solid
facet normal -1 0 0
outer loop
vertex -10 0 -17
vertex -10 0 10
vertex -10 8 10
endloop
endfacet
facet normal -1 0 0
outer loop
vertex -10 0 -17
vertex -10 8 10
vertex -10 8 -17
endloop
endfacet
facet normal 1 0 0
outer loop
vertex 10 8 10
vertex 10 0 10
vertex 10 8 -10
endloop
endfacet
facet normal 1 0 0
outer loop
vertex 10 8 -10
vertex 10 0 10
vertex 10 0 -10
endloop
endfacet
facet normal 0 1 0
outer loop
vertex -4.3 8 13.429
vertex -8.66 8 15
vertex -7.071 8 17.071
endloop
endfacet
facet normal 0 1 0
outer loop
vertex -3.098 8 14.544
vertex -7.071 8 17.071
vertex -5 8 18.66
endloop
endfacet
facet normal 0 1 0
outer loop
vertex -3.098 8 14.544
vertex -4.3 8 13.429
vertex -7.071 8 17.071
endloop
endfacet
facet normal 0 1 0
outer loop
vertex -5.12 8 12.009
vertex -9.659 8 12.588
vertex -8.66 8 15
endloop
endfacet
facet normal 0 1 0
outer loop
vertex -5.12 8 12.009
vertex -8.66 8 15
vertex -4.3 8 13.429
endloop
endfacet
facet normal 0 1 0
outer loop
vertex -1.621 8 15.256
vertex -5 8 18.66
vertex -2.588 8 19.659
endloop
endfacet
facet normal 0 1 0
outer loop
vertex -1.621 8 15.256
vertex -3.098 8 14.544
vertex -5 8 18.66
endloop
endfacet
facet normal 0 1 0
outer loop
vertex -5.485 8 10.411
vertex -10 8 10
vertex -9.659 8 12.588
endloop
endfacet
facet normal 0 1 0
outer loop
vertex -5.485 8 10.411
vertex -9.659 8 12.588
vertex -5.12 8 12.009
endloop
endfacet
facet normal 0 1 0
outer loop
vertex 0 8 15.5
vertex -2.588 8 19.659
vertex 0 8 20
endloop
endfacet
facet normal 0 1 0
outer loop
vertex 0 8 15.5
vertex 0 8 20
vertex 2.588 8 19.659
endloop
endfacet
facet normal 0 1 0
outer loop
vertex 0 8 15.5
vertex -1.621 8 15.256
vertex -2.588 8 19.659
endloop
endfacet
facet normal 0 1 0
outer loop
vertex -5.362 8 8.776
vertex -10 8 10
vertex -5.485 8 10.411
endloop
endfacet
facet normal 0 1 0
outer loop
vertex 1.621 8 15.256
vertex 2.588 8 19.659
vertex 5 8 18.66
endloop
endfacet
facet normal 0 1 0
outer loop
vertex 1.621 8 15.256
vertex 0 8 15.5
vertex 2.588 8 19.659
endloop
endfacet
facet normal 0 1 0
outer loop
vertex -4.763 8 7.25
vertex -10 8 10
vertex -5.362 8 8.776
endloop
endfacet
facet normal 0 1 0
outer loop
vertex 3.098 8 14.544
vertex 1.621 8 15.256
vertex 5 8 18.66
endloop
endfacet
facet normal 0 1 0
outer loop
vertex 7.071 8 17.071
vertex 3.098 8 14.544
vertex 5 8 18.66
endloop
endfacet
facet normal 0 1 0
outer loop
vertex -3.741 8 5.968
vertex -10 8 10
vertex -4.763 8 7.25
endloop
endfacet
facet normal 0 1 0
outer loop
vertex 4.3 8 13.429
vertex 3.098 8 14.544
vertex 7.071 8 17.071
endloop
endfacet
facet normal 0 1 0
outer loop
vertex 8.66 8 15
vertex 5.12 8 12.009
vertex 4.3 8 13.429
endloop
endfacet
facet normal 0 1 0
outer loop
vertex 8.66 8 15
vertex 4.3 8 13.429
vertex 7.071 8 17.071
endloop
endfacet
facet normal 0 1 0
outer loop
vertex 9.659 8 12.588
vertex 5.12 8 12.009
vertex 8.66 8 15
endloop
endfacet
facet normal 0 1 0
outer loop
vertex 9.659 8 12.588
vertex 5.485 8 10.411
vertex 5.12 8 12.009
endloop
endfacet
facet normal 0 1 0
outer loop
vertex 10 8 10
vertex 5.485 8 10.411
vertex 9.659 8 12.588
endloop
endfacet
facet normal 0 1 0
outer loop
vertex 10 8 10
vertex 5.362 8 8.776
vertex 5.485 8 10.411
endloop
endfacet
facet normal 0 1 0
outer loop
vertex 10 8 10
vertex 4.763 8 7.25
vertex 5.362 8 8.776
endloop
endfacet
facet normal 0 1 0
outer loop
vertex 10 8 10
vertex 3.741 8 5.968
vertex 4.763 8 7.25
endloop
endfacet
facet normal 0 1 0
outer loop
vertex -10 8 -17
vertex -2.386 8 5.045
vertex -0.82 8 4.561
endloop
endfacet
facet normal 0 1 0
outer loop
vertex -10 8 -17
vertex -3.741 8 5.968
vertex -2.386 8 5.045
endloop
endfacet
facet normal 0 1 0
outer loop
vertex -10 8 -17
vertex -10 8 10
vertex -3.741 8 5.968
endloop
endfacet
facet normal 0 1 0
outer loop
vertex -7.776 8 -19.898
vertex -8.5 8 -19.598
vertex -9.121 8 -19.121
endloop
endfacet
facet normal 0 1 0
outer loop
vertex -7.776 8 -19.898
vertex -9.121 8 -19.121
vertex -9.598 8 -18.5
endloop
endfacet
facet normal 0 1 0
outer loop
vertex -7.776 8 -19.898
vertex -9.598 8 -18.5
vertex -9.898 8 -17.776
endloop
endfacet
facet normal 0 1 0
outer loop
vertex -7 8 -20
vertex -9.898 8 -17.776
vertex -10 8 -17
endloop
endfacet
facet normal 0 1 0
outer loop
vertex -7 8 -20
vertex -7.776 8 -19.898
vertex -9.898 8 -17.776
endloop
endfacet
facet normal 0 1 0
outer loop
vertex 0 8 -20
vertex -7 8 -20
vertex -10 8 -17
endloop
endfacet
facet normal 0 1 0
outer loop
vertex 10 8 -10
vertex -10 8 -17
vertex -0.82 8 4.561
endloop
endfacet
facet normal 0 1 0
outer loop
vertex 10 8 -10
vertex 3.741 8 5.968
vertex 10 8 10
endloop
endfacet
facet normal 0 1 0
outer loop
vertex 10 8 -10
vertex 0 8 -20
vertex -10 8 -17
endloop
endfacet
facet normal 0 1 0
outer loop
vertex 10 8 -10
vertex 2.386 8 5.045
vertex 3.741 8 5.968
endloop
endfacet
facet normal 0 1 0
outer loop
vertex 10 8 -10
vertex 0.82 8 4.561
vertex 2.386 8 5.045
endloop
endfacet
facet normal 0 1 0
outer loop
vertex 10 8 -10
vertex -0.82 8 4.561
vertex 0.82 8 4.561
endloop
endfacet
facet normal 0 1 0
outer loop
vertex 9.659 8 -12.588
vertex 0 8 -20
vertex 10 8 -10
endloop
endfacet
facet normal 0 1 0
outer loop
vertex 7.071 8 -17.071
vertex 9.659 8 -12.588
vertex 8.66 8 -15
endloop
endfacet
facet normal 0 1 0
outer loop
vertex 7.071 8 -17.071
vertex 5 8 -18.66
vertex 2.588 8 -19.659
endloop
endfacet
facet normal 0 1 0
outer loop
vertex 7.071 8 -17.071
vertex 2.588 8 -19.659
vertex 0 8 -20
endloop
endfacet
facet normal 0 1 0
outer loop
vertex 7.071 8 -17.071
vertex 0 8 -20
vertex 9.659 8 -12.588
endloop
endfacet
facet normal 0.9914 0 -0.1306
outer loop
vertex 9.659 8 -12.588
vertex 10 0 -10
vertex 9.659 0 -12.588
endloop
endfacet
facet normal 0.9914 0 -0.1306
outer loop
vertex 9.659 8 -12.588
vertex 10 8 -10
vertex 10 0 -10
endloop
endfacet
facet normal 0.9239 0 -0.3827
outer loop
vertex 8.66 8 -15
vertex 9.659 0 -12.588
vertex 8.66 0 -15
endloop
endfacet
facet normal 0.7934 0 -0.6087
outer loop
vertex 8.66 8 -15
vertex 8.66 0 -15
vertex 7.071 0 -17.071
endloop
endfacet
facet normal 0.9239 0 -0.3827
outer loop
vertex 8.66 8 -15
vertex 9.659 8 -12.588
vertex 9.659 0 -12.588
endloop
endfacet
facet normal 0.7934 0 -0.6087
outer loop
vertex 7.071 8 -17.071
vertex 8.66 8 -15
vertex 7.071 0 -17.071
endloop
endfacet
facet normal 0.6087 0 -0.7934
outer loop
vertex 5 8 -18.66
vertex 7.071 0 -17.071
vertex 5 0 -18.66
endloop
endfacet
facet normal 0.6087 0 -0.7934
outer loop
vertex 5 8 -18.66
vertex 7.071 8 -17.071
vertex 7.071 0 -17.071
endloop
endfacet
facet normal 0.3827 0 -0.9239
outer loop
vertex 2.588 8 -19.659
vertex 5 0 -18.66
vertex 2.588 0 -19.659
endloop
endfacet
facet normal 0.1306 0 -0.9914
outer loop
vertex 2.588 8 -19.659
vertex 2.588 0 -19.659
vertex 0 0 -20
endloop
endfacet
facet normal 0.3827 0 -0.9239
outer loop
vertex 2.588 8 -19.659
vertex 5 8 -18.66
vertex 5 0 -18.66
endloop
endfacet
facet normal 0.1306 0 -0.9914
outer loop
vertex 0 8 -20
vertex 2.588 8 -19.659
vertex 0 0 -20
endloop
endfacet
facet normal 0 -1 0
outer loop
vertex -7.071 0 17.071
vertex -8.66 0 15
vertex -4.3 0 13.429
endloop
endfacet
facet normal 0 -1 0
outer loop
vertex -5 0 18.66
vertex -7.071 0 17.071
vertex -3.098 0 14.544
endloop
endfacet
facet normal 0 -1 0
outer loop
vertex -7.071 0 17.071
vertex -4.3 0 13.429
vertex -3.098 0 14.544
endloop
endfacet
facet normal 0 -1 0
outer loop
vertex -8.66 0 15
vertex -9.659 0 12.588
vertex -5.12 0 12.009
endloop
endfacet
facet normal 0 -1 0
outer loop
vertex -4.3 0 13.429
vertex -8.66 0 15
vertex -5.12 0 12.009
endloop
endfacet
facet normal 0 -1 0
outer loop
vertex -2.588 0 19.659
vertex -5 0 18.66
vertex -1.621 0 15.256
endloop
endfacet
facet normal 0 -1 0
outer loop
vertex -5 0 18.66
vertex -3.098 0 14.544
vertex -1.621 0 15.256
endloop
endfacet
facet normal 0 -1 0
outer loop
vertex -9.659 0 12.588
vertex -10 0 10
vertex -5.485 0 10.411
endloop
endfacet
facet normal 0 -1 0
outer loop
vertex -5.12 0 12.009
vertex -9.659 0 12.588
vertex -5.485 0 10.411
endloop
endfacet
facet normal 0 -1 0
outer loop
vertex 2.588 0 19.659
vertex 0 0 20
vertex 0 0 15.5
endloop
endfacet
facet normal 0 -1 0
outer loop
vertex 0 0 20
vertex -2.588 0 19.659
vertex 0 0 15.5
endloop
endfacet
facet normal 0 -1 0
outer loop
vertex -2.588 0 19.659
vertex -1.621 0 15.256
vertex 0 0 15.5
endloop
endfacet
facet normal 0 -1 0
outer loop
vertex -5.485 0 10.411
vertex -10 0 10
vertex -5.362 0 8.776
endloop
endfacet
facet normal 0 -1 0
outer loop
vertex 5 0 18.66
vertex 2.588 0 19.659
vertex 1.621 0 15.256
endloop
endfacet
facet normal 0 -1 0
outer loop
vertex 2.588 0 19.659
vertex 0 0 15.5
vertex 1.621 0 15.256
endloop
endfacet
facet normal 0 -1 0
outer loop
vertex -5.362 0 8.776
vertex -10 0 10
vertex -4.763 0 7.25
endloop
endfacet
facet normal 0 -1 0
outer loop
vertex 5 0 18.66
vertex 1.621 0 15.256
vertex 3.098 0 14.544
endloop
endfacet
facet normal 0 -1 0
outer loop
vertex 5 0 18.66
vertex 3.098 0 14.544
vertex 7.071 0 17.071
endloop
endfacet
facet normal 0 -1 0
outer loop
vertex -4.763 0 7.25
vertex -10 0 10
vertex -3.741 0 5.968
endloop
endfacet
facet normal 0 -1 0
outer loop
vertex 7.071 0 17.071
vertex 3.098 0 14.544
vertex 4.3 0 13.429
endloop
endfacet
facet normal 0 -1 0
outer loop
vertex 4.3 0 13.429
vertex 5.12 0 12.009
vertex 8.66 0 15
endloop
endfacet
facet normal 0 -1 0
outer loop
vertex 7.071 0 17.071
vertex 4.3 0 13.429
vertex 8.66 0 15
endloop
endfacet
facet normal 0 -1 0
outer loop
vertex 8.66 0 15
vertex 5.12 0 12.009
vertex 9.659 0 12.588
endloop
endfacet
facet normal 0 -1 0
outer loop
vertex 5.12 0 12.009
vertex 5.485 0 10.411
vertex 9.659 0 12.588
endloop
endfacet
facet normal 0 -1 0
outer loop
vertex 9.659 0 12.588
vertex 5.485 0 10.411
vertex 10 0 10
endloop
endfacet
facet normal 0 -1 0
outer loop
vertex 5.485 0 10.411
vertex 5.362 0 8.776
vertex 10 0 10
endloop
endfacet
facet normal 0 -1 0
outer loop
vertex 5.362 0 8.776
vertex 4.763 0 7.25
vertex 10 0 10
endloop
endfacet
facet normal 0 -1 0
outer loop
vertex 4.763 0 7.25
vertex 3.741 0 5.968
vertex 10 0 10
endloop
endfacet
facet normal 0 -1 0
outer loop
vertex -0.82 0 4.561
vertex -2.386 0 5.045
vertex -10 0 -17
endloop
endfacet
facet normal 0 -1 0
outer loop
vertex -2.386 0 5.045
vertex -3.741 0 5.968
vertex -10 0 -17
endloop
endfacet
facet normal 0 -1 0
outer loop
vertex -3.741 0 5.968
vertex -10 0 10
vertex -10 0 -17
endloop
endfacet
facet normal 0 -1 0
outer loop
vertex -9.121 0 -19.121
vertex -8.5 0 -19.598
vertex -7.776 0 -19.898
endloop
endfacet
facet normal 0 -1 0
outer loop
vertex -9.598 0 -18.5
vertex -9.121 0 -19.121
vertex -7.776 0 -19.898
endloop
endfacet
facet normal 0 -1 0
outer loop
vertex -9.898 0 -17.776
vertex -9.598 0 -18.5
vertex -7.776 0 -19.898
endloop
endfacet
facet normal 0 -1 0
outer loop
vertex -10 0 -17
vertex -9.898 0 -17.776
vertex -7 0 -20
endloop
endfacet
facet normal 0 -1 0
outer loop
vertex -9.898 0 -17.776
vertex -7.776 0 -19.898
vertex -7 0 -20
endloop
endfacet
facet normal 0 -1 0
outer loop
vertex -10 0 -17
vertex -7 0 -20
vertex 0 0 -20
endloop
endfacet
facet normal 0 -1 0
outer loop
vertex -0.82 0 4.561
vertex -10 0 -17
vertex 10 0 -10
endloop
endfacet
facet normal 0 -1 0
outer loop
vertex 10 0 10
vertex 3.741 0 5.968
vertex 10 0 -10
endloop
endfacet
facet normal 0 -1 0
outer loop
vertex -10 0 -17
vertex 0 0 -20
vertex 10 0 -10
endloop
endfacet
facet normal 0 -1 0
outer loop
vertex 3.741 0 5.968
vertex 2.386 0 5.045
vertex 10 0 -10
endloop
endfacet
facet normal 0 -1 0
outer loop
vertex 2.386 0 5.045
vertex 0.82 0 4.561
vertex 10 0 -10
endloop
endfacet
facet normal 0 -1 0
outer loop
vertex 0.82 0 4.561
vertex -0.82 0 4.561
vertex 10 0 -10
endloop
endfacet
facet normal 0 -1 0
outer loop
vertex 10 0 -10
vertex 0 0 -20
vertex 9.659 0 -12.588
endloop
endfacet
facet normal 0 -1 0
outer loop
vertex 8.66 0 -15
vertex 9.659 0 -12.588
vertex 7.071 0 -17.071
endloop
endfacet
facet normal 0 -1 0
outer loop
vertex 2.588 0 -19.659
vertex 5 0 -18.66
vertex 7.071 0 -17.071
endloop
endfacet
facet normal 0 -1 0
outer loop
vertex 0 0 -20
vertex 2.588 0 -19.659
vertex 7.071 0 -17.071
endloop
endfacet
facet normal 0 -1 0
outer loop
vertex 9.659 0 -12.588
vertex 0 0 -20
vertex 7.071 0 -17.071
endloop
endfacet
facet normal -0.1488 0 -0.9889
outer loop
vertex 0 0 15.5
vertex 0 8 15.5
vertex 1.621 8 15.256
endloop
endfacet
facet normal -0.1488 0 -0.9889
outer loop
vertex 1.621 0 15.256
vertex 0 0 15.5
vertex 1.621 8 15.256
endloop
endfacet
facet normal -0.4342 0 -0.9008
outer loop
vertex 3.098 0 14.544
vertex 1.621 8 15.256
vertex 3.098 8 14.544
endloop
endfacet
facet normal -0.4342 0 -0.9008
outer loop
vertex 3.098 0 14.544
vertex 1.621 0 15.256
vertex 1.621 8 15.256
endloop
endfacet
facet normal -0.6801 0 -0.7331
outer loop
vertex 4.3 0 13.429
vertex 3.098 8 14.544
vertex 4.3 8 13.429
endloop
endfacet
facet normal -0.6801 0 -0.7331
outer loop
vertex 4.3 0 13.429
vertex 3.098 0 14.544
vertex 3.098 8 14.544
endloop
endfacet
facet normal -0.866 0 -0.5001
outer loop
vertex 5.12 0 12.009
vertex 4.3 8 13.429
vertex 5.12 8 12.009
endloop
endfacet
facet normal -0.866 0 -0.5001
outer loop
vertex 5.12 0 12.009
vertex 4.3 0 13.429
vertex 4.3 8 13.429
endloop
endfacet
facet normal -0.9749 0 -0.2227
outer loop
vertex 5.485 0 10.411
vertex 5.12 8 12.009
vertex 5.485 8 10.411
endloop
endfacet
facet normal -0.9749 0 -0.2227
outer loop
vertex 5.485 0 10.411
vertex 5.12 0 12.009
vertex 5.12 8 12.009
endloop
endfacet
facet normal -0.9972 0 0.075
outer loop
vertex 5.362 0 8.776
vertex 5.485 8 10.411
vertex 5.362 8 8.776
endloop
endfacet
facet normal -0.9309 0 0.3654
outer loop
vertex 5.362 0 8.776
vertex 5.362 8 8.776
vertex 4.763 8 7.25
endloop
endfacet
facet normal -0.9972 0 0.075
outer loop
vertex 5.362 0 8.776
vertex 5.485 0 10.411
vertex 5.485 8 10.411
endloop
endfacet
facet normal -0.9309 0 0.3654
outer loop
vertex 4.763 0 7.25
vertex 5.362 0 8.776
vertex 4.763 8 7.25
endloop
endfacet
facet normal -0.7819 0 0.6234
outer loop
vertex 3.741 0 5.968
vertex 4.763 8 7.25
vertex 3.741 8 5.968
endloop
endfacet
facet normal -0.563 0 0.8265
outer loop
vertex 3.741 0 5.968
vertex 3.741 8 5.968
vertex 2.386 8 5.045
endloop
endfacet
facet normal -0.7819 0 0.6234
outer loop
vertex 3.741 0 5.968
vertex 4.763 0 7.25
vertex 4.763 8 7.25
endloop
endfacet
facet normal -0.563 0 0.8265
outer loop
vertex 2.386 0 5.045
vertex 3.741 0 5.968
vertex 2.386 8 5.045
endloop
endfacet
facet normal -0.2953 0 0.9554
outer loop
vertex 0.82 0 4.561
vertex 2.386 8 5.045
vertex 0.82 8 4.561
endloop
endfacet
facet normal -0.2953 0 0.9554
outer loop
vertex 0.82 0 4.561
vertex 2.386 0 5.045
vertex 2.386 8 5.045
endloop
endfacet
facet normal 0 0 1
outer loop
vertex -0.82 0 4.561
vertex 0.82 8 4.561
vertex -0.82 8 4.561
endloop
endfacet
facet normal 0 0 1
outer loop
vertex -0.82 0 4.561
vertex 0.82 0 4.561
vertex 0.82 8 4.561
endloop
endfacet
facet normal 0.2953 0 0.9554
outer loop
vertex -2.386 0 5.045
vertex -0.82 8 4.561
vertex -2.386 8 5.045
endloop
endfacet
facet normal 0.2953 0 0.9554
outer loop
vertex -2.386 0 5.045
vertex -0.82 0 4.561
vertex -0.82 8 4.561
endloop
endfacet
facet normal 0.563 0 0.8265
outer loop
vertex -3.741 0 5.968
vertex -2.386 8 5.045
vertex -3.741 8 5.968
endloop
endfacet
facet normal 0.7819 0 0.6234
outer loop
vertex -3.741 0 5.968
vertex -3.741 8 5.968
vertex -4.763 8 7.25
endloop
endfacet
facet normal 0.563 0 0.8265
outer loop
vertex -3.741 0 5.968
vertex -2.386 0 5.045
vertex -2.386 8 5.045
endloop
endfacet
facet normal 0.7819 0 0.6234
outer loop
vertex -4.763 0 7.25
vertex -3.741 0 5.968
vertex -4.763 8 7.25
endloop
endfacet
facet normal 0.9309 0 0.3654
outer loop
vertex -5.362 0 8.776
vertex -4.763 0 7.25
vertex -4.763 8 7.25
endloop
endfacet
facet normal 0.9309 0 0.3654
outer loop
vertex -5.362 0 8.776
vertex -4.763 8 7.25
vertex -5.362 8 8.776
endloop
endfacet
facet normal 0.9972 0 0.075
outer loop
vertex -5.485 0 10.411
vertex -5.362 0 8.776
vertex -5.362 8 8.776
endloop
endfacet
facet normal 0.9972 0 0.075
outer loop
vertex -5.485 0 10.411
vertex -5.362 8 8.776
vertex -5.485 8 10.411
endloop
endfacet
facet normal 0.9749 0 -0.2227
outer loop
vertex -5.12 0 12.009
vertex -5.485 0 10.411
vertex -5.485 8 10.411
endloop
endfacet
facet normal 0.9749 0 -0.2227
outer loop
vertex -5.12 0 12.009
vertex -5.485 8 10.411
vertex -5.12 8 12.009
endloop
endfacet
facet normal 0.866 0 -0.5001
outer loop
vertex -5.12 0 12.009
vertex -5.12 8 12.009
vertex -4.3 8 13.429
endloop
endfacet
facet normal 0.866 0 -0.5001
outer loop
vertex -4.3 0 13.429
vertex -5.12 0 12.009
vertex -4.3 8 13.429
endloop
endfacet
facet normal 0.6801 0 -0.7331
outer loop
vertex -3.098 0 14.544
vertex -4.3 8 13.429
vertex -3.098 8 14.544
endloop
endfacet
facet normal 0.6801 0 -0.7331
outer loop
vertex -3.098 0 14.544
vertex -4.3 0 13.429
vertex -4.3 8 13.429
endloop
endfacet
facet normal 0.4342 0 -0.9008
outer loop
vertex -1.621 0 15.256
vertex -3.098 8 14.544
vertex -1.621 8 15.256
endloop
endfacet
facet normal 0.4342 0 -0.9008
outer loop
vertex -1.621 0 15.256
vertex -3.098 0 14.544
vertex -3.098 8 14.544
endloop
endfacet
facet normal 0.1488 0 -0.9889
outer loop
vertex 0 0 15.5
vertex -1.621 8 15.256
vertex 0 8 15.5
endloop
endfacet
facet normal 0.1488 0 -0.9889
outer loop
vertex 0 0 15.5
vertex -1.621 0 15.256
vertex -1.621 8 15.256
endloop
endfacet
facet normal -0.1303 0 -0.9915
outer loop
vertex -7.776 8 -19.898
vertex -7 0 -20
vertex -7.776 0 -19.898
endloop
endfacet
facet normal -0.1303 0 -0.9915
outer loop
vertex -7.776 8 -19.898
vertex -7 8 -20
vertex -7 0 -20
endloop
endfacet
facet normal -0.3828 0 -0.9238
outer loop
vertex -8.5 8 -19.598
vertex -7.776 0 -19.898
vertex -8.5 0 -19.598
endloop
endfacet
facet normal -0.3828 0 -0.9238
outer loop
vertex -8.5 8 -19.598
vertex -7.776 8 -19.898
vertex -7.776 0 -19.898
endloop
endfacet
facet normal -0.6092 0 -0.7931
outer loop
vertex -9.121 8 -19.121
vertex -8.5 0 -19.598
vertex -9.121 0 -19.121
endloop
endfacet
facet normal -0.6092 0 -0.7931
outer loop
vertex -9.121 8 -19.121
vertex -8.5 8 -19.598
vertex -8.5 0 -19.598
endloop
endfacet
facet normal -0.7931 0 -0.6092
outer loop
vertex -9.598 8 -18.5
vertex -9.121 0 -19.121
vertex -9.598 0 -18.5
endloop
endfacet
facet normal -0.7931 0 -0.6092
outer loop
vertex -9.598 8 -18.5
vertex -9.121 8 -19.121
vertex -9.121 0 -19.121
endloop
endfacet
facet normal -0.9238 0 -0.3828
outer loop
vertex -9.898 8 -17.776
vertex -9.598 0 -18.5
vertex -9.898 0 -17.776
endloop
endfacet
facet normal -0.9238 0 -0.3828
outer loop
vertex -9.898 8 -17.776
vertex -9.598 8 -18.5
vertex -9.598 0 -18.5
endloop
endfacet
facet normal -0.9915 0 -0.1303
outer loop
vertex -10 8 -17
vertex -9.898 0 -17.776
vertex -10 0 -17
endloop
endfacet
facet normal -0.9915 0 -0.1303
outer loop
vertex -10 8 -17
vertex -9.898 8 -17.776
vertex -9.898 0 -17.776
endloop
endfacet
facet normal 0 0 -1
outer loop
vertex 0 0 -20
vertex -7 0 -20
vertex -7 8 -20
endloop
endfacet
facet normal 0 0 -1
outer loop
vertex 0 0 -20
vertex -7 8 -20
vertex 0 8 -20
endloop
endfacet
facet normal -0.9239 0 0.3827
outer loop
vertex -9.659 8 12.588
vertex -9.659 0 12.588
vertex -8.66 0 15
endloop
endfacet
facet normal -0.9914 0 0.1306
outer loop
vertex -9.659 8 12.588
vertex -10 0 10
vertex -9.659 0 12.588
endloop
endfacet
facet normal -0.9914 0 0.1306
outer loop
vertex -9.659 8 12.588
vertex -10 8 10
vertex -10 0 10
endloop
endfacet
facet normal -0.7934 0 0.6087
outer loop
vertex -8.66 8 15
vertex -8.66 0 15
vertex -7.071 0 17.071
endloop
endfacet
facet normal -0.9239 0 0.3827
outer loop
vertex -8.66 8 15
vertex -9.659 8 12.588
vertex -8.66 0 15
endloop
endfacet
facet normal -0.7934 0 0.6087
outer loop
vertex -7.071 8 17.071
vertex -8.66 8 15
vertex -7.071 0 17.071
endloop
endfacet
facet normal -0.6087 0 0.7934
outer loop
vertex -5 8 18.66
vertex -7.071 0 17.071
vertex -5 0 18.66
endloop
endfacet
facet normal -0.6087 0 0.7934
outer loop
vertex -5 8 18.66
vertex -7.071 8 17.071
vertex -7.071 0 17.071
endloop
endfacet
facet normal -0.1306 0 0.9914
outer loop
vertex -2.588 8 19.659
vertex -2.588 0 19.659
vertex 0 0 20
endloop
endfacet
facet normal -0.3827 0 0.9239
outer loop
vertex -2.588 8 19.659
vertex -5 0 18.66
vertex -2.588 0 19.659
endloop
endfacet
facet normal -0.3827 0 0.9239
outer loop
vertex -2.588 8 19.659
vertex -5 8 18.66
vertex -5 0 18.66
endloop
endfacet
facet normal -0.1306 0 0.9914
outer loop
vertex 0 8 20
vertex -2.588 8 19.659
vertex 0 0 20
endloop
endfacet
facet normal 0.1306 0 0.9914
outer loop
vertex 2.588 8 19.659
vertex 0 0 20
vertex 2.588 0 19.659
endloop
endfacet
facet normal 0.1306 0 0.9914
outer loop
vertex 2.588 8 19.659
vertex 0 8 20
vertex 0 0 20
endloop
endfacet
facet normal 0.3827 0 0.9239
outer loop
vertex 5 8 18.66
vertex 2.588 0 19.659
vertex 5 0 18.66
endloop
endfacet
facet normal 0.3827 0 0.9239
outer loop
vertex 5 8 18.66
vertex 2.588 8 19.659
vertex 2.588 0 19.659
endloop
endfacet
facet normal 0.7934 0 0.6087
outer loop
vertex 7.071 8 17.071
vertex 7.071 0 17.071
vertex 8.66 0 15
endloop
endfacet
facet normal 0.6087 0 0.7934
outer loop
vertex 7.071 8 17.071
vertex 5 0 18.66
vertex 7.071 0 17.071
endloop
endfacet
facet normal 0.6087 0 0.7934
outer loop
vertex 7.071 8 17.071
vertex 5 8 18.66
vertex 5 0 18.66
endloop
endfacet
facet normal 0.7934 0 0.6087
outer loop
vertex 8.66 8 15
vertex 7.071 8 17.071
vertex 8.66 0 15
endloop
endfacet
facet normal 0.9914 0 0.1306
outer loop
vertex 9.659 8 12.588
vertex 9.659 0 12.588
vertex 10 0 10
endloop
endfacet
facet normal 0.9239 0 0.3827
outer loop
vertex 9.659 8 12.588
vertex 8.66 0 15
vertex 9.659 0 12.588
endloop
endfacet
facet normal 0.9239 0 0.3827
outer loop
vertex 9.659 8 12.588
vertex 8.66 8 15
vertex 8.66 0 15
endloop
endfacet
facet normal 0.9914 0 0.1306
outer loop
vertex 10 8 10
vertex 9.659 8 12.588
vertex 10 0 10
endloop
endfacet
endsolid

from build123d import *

# Parameters (mm, degrees)
SKETCH1_W           = 20
SKETCH1_H           = 40
SKETCH1_R           = 5.5
BOSS_EXTRUDE1_DEPTH = 8
FILLET1_RADIUS      = 10
FILLET1_LENGTH      = 8
FILLET2_R           = 10
FILLET3_R           = 3


with BuildPart() as part:
    # Sketch1 → Boss-Extrude1 (new body)
    with BuildSketch(Plane(origin=(0, 0, 0), x_dir=(1, 0, 0), z_dir=(0, 1, 0))):
        Rectangle(SKETCH1_W, SKETCH1_H)
        with Locations(Location((0, -10, 0), (0, 0, 270))):
            Circle(SKETCH1_R, mode=Mode.SUBTRACT)
    extrude(amount=BOSS_EXTRUDE1_DEPTH)

    # Fillet1: full round fillet: the end face becomes a half cylinder, R = half its width
    fillet1_face = Plane((0, 4, 20), x_dir=(0, 1, 0), z_dir=(0, 0, 1))  # on the end face: x along it, z out of the body
    fillet1_slab = fillet1_face.offset(-FILLET1_RADIUS / 2) * Box(FILLET1_LENGTH, 2 * FILLET1_RADIUS, FILLET1_RADIUS, mode=Mode.PRIVATE)  # the body's end, R deep
    fillet1_round = Plane((0, 4, 10), x_dir=(0, 0, 1), z_dir=(0, 1, 0)) * Cylinder(FILLET1_RADIUS, FILLET1_LENGTH, mode=Mode.PRIVATE)  # its axis R under the face
    add(fillet1_slab - fillet1_round, mode=Mode.SUBTRACT)

    # Fillet2
    fillet2_edges = [part.edges().sort_by_distance(p)[0] for p in [
        (10, 4, -20),
    ]]
    fillet(fillet2_edges, radius=FILLET2_R)

    # Fillet3
    fillet3_edges = [part.edges().sort_by_distance(p)[0] for p in [
        (-10, 4, -20),
    ]]
    fillet(fillet3_edges, radius=FILLET3_R)


solid = part.part
